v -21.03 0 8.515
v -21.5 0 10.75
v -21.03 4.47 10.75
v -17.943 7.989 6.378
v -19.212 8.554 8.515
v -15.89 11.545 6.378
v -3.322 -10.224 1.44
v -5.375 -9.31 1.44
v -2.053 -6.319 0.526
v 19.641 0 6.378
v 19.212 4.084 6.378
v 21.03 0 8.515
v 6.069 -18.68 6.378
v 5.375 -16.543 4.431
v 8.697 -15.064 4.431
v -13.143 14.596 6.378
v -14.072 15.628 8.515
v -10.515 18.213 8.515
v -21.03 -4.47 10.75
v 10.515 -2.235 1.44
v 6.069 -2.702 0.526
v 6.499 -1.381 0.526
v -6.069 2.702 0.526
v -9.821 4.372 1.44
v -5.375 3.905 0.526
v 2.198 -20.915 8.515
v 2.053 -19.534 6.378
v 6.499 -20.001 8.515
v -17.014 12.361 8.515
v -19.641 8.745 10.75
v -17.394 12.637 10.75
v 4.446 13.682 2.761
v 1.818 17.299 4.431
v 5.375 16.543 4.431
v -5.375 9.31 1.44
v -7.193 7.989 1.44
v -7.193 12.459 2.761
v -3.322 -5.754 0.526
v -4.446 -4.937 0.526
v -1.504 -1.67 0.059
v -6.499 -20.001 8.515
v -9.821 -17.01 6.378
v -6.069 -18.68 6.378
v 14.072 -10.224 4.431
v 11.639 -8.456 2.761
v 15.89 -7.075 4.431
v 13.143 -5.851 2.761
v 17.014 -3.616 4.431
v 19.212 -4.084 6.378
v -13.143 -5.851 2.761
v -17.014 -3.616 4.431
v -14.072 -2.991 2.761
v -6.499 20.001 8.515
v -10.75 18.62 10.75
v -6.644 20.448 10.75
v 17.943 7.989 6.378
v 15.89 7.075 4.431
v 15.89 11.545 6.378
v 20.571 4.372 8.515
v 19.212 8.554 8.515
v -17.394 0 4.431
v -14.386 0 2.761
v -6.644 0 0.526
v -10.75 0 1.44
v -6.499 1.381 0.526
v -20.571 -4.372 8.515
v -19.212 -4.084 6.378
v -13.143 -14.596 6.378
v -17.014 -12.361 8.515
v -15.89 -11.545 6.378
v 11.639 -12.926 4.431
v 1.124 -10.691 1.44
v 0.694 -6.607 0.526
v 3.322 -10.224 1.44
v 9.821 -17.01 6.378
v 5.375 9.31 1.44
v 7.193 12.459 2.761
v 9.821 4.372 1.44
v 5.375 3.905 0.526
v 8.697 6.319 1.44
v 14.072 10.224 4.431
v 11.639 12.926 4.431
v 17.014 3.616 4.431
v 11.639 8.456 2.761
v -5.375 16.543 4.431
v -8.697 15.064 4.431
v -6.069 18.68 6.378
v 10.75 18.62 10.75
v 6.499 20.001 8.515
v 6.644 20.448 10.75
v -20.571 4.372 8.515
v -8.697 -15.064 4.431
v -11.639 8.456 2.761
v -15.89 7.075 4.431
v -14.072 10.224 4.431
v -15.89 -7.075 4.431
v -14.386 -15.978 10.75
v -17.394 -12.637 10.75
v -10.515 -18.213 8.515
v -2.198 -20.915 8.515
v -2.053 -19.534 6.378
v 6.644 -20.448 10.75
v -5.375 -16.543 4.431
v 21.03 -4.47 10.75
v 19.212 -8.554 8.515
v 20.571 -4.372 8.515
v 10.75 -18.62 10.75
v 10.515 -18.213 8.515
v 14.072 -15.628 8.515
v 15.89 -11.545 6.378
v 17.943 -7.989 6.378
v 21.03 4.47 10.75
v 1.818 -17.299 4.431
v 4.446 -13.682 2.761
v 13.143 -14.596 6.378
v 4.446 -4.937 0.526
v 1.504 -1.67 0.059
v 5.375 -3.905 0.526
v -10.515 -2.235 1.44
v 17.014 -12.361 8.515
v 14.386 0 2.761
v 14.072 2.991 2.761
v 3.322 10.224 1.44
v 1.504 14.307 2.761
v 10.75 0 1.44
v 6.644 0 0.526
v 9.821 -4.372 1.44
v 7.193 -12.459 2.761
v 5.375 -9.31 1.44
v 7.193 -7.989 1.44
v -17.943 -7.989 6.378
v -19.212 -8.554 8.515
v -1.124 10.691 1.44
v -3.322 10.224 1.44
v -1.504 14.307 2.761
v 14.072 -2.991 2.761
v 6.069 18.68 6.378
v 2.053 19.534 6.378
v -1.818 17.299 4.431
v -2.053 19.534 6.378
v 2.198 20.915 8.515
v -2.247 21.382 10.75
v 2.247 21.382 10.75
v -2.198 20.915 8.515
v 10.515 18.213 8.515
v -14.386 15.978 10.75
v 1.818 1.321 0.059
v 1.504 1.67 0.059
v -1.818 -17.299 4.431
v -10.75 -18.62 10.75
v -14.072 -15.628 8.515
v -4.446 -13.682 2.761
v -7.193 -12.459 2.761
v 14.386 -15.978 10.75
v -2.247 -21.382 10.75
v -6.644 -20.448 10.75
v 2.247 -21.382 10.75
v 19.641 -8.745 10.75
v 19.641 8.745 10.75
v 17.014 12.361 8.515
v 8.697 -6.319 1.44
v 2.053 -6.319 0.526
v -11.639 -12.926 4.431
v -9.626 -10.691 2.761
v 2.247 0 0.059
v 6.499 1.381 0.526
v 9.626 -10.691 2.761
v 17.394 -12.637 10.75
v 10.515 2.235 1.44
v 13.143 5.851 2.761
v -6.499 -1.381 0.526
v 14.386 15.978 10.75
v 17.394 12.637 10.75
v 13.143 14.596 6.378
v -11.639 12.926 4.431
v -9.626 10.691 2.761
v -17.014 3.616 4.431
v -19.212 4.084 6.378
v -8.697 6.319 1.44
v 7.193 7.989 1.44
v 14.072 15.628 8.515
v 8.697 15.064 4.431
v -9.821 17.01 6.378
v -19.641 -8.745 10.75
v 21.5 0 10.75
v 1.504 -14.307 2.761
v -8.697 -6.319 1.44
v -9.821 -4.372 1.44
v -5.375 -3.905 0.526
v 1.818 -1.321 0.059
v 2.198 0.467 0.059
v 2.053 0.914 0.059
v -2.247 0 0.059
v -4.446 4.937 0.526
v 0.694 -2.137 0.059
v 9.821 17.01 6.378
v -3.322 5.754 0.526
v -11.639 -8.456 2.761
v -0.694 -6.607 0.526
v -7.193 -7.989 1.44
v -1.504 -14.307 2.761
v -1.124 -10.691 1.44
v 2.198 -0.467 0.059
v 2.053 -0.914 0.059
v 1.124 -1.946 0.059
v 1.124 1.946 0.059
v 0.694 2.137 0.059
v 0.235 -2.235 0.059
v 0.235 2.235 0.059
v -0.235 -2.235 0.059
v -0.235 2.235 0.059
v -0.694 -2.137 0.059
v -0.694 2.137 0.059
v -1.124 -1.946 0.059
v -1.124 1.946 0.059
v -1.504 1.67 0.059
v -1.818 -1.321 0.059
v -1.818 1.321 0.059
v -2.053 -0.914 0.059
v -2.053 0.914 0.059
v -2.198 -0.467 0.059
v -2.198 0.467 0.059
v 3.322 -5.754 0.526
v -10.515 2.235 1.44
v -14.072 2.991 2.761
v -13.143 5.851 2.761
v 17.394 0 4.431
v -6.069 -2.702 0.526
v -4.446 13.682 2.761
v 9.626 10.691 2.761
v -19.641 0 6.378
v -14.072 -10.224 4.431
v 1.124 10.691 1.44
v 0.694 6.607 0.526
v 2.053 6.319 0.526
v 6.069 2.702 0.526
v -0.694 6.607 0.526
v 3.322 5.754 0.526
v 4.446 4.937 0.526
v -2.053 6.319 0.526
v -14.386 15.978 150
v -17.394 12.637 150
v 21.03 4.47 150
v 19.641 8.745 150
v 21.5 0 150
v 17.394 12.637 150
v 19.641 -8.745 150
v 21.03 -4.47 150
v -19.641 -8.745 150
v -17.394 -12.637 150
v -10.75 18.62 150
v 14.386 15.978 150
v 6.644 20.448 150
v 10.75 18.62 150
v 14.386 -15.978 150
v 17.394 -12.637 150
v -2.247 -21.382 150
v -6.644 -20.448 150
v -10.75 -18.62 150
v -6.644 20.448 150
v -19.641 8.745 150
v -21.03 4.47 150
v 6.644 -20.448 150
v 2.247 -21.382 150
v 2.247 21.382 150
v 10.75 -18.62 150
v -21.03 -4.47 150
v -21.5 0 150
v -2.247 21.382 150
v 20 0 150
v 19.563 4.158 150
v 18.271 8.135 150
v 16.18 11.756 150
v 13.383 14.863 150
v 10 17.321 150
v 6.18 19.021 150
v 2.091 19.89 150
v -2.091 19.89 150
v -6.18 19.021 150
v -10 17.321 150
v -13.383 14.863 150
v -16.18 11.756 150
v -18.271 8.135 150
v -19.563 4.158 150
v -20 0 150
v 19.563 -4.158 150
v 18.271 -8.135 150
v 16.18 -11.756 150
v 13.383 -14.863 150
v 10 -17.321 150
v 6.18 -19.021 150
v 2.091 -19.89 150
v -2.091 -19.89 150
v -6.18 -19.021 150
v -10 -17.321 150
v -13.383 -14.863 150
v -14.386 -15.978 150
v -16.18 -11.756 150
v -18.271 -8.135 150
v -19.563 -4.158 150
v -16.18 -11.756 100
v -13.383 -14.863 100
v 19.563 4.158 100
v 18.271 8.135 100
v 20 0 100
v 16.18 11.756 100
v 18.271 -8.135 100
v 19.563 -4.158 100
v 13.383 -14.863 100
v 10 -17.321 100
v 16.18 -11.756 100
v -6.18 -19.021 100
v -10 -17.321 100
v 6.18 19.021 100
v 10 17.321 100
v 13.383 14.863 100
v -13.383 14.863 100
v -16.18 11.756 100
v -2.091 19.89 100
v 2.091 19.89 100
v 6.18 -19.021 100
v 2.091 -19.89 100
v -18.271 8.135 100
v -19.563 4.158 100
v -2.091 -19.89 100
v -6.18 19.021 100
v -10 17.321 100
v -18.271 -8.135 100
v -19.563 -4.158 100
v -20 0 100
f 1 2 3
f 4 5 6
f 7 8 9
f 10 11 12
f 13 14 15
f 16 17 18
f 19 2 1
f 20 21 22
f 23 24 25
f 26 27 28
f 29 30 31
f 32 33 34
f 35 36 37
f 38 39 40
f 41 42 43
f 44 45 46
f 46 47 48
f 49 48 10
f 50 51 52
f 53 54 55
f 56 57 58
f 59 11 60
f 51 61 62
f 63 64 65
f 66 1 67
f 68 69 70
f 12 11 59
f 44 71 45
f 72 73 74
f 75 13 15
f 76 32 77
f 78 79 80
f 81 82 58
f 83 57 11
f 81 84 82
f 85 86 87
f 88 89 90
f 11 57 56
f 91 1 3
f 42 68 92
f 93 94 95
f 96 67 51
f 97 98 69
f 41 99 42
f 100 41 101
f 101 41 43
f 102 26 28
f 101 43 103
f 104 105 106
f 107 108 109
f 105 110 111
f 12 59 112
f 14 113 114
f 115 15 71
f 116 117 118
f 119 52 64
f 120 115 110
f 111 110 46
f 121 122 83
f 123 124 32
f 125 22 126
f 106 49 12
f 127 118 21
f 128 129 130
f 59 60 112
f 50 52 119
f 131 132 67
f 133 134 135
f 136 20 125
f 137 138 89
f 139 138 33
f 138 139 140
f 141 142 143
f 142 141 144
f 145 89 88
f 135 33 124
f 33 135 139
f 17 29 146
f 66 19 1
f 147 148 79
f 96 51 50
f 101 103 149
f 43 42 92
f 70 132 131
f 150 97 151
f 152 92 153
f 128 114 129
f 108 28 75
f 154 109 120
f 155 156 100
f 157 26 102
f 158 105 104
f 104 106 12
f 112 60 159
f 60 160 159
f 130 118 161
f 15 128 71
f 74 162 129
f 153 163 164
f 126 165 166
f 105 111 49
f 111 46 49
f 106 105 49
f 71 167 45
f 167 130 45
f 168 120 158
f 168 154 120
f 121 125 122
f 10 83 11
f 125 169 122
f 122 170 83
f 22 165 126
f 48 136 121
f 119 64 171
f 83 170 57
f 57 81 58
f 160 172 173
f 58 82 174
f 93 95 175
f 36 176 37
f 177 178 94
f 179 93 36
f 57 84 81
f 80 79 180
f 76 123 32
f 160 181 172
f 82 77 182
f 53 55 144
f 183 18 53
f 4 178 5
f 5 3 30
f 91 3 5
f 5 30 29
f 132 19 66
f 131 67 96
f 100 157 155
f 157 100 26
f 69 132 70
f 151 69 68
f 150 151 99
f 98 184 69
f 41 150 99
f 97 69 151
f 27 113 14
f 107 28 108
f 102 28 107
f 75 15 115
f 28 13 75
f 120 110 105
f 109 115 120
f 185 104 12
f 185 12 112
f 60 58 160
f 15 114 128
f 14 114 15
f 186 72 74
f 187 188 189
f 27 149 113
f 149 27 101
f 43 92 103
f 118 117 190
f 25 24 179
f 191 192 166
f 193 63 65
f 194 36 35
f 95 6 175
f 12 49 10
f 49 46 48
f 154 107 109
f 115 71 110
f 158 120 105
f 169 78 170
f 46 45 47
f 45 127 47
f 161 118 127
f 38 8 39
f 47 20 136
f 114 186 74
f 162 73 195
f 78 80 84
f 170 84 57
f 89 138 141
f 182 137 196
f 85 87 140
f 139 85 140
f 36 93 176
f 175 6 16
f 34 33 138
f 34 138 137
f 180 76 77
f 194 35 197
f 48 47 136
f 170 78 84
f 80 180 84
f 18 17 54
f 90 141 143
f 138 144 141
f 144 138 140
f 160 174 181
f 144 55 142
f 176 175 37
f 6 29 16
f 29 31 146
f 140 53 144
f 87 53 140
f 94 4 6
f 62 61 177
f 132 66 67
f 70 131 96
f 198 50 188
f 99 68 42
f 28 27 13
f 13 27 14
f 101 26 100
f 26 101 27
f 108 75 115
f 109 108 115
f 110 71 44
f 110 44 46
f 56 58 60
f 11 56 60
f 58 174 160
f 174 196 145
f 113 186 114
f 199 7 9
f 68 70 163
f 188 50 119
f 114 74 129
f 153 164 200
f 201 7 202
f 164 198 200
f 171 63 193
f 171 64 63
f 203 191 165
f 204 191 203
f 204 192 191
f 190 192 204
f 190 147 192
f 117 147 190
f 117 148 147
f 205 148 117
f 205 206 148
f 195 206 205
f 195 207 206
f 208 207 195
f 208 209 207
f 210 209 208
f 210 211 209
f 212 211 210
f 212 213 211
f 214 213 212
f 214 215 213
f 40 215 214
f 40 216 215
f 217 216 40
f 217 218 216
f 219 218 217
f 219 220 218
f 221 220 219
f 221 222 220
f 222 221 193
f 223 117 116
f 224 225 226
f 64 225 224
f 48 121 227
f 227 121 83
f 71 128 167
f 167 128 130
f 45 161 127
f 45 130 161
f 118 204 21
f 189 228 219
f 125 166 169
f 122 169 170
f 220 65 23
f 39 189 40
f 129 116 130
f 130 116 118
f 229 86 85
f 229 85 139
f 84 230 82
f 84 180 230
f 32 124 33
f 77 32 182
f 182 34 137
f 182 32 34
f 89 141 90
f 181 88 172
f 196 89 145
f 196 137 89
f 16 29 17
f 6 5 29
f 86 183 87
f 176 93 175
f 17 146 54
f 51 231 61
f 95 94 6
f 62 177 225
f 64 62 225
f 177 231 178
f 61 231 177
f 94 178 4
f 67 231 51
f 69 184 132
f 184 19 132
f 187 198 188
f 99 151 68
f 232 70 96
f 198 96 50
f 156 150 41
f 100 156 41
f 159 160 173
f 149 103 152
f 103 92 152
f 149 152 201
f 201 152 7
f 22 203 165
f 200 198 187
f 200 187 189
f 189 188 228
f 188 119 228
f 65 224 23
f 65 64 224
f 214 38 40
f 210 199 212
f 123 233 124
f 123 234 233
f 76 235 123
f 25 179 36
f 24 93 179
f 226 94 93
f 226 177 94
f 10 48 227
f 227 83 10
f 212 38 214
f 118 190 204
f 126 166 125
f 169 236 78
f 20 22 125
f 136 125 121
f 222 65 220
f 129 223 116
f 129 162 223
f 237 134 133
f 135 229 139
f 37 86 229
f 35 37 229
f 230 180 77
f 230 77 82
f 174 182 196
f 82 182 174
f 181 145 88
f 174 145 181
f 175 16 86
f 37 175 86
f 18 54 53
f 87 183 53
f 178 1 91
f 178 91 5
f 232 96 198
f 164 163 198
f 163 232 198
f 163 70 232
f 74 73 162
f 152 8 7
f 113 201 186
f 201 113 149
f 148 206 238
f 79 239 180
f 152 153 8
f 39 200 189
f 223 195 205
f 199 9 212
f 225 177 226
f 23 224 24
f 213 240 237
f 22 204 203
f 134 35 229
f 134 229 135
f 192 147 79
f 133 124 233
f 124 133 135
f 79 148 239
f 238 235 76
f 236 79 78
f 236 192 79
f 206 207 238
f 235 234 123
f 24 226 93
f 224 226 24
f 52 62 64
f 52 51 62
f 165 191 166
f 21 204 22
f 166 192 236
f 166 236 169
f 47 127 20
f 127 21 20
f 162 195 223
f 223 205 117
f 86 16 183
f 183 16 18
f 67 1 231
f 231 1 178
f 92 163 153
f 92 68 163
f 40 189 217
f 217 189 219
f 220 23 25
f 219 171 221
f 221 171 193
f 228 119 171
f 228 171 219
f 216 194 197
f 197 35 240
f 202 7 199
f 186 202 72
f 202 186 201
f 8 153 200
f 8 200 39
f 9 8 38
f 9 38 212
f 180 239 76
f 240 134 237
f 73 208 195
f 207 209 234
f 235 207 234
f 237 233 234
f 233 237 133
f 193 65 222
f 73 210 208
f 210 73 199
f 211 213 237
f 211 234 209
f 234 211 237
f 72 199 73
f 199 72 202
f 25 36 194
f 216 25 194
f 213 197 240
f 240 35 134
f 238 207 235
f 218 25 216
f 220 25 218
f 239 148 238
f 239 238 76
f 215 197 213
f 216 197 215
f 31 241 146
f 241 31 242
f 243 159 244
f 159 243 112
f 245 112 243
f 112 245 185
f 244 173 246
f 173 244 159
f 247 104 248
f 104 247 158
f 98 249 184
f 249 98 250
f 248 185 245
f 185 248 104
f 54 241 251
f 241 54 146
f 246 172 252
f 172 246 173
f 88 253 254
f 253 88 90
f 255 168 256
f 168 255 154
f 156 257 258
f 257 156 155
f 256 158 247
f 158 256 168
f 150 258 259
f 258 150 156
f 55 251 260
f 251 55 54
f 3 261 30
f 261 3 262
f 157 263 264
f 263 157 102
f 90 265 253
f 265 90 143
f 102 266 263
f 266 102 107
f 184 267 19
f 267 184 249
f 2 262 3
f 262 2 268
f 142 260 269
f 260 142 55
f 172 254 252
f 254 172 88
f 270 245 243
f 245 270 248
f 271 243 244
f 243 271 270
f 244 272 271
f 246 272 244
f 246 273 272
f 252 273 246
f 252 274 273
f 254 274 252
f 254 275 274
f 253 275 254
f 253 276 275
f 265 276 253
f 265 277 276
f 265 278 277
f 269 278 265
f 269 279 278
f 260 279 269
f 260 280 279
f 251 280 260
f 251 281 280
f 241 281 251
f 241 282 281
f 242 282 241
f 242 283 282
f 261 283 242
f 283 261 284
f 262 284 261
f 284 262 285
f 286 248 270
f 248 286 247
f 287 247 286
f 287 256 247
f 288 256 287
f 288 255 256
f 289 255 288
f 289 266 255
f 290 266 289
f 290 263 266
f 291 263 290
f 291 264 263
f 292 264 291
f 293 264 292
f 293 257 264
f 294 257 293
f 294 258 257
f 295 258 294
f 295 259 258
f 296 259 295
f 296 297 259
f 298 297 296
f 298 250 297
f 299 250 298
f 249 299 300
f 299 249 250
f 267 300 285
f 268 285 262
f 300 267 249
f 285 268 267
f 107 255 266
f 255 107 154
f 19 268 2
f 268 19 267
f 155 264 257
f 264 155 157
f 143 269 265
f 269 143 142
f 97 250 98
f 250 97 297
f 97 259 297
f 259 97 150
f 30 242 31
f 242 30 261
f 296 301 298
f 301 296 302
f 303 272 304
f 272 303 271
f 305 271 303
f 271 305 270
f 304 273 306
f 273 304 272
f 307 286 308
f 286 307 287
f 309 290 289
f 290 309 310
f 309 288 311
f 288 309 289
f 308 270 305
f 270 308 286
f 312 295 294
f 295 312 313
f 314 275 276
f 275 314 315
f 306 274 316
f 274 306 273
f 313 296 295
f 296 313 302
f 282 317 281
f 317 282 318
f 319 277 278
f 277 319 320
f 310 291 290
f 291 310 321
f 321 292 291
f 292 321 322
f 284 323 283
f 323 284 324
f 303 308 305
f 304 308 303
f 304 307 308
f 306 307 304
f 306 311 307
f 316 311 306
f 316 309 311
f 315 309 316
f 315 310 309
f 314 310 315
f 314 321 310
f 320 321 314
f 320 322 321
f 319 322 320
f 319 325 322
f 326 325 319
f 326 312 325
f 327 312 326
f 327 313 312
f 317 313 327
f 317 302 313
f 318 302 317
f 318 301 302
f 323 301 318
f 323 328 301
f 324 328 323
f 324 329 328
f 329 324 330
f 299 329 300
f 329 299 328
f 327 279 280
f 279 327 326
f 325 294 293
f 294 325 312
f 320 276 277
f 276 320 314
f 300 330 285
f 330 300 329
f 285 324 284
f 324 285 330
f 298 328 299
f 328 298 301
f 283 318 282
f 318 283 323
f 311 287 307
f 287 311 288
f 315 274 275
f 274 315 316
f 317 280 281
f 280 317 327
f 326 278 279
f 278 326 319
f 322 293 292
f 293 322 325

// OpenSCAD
id = 40;
wall_thickness = 3;
od = id + wall_thickness;
h_rise = 100;
h = h_rise + 50;

h_ball = od/2;


module riser() {
  difference() {
  union() {
  translate([0, 0, h_ball/2])scale([1, 1, .5])sphere(r=od/2);
  translate([0, 0, h_ball/2])cylinder(r=od/2, h=h-h_ball/2);
  }
  translate([0, 0, h_rise])cylinder(r=id/2, h=h - h_rise+1);
  }
}

riser(); // make me
